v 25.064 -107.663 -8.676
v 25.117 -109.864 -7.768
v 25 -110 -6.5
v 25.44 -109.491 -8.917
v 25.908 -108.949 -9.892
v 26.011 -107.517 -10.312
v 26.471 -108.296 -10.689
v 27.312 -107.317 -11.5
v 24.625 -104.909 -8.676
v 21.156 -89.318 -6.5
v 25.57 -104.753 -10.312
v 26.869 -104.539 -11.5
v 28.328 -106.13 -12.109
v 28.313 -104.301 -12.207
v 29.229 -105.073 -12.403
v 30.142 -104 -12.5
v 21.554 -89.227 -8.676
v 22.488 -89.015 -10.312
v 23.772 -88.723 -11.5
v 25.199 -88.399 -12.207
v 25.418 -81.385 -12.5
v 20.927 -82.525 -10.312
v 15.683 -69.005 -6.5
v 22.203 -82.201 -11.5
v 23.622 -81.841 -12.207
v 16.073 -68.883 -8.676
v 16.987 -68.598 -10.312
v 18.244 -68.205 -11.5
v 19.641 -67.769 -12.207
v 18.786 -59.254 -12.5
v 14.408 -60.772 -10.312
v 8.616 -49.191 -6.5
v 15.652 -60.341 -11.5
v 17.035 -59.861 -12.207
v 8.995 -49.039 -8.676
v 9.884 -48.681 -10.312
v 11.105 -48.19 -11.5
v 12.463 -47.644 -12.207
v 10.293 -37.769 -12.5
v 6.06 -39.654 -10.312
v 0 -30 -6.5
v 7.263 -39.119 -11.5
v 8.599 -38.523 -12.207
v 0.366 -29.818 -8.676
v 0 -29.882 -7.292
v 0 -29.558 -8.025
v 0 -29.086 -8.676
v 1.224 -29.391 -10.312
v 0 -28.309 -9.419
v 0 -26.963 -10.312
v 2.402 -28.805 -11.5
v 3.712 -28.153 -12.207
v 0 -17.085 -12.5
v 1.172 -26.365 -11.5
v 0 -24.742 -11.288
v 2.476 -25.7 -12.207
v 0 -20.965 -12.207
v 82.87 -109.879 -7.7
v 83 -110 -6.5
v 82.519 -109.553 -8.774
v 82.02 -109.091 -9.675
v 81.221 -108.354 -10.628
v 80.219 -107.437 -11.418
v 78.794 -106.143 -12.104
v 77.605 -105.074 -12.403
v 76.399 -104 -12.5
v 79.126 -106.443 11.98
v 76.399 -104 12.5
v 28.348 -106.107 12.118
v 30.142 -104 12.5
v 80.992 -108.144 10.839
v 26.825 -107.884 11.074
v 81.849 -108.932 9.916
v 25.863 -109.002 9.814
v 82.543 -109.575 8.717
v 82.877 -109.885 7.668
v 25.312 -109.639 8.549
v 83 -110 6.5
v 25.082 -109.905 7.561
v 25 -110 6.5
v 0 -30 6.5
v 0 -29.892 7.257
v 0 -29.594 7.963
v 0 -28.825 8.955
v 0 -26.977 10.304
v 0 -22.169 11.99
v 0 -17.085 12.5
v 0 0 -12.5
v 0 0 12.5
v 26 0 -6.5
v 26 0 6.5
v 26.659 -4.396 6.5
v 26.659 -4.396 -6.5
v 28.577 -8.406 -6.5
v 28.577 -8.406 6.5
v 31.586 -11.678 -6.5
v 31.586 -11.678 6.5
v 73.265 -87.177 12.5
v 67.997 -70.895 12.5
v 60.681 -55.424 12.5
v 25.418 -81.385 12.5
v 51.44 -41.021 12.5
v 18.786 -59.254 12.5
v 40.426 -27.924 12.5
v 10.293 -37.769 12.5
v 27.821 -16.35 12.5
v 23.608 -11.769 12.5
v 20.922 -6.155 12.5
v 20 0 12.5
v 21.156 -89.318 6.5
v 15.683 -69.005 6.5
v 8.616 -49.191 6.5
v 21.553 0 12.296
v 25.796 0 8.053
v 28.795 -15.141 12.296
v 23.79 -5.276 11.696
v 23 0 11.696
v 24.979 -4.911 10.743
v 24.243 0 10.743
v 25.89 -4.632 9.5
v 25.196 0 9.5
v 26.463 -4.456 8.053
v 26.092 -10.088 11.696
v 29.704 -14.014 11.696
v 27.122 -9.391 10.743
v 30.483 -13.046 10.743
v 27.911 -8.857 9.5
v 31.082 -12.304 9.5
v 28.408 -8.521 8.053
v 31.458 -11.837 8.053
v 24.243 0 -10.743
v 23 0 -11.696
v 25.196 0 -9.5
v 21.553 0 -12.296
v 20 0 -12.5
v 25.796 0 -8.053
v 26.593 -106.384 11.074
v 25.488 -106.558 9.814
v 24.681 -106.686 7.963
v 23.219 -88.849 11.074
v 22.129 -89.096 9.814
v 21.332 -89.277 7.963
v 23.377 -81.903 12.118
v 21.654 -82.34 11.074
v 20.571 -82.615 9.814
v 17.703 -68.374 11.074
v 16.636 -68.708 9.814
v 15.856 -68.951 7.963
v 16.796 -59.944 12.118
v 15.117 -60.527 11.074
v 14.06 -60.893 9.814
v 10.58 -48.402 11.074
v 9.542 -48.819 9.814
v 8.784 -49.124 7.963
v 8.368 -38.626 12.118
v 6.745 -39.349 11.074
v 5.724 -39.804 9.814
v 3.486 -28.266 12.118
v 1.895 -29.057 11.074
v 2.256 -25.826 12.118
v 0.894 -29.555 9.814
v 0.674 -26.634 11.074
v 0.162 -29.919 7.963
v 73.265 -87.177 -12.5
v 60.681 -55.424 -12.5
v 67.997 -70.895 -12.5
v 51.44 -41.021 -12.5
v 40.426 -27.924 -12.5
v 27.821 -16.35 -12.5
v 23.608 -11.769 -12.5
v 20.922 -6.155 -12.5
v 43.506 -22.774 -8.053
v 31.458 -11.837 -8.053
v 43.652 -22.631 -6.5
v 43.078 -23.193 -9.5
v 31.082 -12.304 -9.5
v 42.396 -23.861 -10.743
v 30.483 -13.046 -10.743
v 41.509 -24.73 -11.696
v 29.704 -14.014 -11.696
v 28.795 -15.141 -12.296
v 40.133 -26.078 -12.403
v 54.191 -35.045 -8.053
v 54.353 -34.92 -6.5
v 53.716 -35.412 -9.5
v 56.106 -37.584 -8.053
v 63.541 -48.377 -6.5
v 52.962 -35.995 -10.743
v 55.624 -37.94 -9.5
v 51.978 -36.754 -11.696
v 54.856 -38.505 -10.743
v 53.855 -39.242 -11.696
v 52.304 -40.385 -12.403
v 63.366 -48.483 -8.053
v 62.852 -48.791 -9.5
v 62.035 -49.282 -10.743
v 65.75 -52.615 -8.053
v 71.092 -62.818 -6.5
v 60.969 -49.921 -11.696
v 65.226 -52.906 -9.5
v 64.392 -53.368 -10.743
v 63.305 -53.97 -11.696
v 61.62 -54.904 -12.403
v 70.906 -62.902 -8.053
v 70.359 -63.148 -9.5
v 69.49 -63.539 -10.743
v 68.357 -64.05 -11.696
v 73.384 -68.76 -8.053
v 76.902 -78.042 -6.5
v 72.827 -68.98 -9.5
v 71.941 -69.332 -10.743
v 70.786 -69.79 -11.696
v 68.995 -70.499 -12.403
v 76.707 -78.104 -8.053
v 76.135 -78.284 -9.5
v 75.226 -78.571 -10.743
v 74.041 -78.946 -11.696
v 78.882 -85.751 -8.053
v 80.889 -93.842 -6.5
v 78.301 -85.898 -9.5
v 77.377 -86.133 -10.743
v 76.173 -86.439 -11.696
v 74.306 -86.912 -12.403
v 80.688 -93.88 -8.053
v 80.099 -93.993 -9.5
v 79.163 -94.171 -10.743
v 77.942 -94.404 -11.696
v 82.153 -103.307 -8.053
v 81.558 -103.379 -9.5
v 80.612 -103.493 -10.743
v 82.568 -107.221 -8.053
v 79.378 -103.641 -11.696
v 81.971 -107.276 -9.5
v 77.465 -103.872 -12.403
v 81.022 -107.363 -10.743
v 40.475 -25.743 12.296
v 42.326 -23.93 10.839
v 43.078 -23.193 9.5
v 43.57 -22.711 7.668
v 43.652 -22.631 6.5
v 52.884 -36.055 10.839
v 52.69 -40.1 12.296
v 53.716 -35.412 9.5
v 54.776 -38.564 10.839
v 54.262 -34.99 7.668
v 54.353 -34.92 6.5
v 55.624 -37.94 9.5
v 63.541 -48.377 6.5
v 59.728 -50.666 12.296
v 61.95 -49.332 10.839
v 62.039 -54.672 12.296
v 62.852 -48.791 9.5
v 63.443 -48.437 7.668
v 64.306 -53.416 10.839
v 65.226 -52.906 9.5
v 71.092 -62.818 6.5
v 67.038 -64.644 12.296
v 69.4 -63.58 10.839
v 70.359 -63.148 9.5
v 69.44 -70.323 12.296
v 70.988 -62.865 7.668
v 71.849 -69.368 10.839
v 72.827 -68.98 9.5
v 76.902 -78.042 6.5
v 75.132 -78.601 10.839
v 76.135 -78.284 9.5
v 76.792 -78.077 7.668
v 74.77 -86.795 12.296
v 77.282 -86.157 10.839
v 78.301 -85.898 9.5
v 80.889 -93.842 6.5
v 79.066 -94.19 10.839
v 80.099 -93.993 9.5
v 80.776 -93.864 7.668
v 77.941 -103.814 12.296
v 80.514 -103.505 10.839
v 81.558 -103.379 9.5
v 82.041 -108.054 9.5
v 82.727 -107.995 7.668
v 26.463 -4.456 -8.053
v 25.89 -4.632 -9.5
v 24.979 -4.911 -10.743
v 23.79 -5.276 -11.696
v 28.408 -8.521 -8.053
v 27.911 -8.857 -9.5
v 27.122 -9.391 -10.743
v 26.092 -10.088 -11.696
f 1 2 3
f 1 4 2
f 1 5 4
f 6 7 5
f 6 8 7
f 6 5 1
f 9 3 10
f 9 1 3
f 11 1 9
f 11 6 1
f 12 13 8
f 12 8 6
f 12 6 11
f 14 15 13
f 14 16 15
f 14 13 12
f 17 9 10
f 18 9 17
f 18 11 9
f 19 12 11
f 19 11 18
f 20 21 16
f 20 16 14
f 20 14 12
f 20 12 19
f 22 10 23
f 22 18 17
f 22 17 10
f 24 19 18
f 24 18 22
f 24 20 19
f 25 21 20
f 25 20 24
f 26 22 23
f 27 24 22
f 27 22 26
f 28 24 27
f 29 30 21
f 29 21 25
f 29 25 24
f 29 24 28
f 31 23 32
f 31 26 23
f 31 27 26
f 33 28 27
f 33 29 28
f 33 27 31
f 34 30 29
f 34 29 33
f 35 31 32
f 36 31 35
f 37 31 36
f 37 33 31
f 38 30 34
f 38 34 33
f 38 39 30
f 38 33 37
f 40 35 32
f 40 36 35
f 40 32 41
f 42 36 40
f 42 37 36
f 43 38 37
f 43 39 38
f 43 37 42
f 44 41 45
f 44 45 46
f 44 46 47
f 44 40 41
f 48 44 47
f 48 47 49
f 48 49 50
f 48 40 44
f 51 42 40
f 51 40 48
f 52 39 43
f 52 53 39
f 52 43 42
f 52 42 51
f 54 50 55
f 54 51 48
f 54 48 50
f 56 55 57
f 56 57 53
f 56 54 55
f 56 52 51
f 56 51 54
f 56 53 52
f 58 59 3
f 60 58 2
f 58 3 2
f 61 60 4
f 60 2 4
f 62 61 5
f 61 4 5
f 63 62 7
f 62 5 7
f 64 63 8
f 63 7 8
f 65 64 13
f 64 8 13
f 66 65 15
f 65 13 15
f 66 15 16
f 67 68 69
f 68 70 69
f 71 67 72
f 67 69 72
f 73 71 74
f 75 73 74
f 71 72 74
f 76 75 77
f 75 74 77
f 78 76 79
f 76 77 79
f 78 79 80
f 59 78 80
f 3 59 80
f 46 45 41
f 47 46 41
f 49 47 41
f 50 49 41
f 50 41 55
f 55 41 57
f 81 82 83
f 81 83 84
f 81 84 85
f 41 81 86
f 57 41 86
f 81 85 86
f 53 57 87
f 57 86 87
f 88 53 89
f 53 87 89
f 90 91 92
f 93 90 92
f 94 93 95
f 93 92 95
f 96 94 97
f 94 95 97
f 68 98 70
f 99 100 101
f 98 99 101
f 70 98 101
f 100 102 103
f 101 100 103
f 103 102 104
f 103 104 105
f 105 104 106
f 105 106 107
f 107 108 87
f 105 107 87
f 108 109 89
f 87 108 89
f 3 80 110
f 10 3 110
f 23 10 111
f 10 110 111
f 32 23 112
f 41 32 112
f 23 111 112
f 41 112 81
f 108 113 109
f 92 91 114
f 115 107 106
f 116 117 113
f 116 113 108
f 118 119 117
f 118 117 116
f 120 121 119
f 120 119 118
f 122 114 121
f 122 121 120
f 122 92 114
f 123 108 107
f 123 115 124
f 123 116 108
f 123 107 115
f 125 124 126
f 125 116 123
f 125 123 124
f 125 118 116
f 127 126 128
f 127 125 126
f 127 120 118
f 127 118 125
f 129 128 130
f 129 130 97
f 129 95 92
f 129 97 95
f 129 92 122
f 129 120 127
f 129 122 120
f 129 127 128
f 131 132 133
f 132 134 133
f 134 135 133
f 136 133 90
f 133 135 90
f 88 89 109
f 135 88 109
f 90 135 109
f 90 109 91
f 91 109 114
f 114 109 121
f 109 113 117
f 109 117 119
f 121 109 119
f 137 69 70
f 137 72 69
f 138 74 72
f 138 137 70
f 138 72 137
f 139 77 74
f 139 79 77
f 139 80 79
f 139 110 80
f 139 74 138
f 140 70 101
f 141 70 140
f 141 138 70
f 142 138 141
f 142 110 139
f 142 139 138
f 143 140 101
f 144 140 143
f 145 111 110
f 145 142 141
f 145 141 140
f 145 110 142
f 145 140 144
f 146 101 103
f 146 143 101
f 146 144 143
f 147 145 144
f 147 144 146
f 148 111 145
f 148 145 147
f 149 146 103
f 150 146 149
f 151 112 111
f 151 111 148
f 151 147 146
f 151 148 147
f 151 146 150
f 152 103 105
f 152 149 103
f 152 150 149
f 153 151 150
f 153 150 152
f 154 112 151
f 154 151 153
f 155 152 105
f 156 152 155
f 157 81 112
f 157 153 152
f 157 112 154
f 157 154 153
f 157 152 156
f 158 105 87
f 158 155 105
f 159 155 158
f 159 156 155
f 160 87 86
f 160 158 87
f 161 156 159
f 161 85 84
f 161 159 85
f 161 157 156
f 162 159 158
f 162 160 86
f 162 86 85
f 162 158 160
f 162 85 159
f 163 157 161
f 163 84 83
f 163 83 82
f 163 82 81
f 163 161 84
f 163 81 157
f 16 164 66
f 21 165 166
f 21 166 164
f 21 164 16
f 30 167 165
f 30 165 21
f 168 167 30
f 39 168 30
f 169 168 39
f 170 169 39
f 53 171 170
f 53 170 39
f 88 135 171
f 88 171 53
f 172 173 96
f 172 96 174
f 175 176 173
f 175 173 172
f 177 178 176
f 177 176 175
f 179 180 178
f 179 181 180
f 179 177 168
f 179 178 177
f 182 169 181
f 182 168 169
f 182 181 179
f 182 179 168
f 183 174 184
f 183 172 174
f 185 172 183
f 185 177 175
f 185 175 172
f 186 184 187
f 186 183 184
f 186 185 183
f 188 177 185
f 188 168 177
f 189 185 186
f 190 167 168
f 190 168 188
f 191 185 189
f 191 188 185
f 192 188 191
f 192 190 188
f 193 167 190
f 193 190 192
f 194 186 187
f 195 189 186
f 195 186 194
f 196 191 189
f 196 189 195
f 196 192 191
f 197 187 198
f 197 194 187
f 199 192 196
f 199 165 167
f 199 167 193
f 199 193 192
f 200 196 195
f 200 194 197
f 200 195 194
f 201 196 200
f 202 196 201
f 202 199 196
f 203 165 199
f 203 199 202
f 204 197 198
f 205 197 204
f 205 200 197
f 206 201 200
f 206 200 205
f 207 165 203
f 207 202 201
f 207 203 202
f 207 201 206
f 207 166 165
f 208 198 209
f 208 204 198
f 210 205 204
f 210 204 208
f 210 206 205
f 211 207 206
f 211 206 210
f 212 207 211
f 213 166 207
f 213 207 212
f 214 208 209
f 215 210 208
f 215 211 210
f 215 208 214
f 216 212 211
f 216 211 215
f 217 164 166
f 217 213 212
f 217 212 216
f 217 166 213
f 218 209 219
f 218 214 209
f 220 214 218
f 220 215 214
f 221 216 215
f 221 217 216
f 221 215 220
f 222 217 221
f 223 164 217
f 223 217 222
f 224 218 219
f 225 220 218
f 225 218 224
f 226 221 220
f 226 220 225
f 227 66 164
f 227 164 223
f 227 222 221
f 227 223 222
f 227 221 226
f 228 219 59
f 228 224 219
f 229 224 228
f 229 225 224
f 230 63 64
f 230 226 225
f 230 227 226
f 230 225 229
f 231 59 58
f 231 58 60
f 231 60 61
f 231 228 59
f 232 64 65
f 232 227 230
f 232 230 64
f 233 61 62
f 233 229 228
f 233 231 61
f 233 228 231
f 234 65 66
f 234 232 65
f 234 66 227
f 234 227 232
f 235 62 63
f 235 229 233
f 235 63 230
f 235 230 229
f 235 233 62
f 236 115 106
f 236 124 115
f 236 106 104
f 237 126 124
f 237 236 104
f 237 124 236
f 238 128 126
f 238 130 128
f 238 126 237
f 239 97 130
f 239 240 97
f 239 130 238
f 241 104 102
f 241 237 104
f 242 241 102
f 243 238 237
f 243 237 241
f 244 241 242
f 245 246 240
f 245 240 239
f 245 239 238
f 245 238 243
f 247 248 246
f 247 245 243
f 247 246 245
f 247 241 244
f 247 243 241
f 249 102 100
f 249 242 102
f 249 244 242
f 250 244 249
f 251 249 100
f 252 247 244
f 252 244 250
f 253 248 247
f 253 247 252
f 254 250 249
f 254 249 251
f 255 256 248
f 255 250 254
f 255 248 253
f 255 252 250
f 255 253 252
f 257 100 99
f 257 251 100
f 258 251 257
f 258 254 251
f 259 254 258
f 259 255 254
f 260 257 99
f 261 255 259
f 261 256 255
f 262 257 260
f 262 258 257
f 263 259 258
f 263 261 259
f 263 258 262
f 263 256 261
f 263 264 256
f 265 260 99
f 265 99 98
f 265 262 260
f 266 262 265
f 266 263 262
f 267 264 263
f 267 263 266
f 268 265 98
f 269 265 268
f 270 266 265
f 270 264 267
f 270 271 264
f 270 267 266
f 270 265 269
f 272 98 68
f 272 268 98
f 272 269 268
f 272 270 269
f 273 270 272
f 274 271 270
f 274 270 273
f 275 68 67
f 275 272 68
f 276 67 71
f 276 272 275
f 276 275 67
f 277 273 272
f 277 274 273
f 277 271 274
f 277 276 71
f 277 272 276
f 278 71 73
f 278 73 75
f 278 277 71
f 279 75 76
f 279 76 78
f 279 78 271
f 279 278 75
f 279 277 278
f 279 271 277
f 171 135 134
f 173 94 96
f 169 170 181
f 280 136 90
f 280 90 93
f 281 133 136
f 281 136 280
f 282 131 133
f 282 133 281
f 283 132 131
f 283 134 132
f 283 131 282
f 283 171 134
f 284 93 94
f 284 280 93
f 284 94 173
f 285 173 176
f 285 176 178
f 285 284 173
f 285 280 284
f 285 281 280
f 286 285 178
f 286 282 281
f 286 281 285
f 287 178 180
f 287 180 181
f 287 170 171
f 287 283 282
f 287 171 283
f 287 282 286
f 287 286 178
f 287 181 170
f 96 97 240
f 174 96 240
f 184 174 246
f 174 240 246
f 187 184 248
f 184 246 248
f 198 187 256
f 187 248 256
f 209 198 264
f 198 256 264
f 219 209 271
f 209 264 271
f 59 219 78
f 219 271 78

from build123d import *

# Parameters (mm, degrees)
EXTRUDE_1_DEPTH = 12.5
FILLET_1_R      = 6


with BuildPart() as part:
    # 草图1 → 凸台-拉伸1 (new, symmetric)
    with BuildSketch(Plane.XY):
        with BuildLine():
            Line((0, 0), (26, 0))
            ThreePointArc((26, 0), (27.468456661, -6.472815065), (31.586311315, -11.678290343))
            ThreePointArc((31.586311315, -11.678290343), (67.528745318, -55.48682347), (83, -110))
            Line((83, -110), (25, -110))
            ThreePointArc((25, -110), (15.68286649, -69.005354222), (0, -30))
            Line((0, -30), (0, 0))
        make_face()
    extrude(amount=EXTRUDE_1_DEPTH, both=True)

    # 圆角1
    fillet_1_edges = [part.edges().sort_by_distance(p)[0] for p in [
        (54, -110, 12.5),
        (67.528745318, -55.48682347, 12.5),
        (27.468456661, -6.472815065, 12.5),
        (27.468456661, -6.472815065, -12.5),
        (67.528745318, -55.48682347, -12.5),
        (54, -110, -12.5),
        (15.68286649, -69.005354222, -12.5),
        (15.68286649, -69.005354222, 12.5),
    ]]
    fillet(fillet_1_edges, radius=FILLET_1_R)


solid = part.part
